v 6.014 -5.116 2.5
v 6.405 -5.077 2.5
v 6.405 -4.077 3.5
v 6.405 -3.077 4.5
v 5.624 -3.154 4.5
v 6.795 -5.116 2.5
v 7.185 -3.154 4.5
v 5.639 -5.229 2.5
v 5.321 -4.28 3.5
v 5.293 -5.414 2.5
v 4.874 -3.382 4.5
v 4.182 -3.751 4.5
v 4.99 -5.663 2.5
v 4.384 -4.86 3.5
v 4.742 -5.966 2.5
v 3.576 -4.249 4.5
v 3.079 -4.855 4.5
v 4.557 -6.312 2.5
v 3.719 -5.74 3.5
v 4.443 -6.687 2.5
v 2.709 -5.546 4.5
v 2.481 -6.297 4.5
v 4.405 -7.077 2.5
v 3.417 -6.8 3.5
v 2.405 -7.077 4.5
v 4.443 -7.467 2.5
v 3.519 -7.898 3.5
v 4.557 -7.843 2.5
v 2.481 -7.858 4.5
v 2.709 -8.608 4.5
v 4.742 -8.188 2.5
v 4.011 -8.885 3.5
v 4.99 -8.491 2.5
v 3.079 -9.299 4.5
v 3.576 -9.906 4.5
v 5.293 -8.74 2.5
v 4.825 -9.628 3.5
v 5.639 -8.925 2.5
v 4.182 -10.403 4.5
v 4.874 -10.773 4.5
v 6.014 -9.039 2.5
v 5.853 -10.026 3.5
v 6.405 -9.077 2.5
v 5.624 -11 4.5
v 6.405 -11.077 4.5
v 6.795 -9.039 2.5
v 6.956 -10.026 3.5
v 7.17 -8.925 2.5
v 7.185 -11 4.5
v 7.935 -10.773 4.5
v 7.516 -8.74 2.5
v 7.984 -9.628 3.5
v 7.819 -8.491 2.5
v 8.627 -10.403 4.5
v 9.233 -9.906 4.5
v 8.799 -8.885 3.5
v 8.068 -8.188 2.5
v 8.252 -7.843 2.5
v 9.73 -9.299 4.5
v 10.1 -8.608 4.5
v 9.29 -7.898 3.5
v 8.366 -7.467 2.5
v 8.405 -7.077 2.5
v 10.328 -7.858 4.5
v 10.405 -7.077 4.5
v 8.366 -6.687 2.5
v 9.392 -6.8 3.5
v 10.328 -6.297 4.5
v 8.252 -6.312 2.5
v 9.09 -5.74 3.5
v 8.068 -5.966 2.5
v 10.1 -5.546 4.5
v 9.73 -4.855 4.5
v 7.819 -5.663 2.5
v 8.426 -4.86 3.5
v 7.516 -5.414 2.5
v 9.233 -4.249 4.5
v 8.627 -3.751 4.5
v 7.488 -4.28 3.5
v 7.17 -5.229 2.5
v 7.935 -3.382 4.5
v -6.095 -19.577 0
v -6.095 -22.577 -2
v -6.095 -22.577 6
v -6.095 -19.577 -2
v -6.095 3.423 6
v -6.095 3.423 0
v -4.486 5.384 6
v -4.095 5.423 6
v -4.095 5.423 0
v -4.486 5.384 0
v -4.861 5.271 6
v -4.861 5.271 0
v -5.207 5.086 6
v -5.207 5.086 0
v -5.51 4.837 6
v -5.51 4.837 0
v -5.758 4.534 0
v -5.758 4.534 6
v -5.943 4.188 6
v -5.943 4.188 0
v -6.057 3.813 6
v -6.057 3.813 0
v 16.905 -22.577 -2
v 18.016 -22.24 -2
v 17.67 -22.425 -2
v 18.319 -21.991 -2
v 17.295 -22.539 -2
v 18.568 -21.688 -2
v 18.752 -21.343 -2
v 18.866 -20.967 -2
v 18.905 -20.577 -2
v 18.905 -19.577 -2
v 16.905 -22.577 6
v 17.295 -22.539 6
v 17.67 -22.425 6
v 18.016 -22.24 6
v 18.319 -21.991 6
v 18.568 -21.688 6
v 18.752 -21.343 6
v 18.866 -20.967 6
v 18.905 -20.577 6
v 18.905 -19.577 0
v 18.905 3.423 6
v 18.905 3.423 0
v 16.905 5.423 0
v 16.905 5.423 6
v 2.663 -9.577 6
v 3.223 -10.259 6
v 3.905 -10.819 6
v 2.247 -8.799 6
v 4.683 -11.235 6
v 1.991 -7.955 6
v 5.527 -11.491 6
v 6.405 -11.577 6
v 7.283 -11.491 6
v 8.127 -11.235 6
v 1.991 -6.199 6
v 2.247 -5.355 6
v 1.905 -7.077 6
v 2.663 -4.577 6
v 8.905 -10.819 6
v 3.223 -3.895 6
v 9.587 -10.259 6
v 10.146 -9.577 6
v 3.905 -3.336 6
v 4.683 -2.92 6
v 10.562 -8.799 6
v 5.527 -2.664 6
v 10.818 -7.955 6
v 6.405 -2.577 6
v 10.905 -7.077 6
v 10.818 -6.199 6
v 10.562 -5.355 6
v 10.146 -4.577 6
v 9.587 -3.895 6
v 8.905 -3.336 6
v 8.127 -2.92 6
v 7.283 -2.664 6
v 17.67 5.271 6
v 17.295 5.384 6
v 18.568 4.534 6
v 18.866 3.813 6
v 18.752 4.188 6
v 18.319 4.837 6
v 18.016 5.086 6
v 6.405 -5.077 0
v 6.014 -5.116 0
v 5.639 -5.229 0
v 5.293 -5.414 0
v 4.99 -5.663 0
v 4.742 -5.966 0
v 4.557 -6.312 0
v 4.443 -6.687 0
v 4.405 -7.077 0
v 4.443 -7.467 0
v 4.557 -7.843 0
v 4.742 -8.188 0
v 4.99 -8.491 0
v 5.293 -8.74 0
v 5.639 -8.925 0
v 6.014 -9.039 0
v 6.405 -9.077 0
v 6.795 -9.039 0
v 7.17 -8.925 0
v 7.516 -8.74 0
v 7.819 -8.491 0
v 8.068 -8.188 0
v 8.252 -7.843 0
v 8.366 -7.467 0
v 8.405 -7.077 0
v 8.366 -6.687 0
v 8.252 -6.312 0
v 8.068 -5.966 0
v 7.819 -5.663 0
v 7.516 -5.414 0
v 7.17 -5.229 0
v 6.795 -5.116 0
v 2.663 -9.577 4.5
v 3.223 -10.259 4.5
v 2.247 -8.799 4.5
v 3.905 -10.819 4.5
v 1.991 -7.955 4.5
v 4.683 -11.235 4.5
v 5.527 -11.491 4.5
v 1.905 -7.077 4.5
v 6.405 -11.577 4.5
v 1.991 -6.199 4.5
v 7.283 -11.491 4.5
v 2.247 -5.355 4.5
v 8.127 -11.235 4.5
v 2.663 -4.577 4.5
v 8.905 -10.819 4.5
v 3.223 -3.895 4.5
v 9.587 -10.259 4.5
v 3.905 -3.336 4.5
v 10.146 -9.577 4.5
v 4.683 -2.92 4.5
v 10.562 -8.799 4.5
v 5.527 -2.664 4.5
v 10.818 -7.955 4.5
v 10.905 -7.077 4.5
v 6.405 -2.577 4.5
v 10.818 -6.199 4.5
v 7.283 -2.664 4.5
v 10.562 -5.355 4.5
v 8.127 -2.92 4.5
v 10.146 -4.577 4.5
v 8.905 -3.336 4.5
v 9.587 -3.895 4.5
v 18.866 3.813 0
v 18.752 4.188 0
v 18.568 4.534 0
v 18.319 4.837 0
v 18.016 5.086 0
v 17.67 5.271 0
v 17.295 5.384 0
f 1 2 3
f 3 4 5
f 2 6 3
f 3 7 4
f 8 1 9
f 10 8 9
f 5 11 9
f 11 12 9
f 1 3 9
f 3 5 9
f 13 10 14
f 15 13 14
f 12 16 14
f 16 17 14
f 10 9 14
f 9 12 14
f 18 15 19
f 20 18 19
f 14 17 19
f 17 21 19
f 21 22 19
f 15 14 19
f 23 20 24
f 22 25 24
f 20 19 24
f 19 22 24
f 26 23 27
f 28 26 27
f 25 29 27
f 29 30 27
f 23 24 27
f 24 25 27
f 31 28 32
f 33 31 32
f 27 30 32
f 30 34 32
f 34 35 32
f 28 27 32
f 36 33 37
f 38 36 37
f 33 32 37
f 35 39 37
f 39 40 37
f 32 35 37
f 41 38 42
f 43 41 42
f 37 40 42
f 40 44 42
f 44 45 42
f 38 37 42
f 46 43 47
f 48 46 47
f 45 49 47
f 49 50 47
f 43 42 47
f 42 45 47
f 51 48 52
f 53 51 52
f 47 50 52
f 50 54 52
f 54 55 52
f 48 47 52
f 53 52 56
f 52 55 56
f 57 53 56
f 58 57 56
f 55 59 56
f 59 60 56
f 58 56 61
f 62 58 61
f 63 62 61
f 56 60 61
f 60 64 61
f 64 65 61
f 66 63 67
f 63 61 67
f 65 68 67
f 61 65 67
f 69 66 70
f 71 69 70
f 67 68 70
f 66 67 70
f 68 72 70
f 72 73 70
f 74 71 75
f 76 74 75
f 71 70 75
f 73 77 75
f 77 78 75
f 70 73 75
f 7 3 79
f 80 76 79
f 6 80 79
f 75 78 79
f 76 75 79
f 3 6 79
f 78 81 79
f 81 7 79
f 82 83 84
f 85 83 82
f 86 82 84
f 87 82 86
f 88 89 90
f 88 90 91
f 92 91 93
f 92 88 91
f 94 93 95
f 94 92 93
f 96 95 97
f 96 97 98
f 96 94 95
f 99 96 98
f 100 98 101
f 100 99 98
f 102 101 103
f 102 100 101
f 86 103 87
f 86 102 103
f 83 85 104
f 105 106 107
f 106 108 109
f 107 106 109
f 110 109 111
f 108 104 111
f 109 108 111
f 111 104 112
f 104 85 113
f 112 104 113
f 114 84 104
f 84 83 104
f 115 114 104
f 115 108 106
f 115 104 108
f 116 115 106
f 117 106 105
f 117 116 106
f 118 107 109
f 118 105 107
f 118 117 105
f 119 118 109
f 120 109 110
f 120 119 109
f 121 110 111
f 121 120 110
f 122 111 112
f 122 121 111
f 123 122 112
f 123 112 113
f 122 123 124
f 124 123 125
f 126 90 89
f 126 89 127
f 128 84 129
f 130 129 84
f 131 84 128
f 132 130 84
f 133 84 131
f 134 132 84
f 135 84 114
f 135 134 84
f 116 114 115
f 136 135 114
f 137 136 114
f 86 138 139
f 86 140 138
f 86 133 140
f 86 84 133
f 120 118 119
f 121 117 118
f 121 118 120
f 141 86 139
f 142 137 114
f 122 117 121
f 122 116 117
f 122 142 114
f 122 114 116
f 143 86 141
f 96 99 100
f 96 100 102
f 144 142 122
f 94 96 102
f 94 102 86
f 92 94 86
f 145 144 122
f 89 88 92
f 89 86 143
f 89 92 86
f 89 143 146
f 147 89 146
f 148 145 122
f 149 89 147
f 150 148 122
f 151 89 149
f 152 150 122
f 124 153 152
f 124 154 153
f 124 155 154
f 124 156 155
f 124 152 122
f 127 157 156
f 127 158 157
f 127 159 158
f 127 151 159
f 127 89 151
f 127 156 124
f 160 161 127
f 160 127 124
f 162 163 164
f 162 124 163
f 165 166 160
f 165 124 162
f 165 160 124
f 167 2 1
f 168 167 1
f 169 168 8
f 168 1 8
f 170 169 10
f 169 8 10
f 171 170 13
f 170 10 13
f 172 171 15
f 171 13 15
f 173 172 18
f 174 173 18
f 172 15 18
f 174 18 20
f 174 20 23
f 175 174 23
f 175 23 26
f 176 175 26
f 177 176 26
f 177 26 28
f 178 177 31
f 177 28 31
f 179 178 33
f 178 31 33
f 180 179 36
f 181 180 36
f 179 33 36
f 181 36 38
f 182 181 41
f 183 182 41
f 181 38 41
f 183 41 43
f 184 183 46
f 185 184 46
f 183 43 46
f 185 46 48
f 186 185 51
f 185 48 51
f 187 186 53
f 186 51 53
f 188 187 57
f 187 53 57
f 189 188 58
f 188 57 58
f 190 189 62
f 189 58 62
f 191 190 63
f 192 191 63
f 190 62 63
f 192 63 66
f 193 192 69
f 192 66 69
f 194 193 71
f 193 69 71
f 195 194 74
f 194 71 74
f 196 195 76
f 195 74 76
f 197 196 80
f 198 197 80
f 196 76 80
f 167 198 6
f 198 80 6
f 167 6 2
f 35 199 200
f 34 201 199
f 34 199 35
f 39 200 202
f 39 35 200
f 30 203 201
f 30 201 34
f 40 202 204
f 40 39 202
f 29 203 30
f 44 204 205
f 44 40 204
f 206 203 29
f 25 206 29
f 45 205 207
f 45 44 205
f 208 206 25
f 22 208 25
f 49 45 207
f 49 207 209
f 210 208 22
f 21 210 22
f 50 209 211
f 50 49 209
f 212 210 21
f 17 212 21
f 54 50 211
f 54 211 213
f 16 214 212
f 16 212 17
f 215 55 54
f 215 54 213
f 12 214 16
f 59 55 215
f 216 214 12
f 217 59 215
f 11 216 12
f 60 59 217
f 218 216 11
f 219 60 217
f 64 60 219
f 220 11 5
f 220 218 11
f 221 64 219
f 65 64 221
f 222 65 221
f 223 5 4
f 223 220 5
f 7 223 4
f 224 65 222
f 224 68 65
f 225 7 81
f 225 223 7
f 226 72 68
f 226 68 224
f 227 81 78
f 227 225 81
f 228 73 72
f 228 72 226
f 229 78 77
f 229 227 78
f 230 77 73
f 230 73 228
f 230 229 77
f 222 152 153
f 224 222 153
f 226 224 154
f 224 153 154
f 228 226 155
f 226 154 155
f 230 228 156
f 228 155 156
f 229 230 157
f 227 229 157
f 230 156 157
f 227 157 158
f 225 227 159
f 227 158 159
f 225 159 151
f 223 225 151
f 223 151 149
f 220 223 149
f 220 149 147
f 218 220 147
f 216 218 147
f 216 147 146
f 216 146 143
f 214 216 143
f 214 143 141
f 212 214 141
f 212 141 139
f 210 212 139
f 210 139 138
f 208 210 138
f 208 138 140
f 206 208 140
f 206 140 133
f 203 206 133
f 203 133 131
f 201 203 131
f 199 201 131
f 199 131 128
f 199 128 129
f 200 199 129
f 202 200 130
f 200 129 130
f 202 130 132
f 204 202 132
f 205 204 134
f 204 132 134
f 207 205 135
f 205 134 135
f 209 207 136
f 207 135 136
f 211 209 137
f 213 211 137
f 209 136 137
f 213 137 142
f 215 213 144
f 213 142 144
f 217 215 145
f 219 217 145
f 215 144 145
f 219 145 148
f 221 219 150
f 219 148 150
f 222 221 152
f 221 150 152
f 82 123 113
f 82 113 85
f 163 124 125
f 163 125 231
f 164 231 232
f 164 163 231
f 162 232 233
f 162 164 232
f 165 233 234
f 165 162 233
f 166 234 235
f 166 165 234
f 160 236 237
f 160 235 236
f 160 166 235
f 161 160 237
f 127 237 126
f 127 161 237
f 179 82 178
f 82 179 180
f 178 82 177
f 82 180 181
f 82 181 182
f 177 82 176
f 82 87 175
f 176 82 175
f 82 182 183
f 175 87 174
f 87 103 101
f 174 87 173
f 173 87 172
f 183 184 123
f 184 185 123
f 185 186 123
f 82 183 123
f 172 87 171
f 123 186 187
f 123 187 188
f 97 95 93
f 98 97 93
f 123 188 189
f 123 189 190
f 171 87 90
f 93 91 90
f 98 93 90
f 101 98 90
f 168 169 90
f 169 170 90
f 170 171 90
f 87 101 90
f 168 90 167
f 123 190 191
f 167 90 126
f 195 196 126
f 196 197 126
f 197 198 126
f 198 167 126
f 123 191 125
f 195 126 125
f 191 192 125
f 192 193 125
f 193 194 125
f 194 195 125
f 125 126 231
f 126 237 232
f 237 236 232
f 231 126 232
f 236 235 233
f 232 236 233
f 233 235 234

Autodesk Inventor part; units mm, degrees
ref_plane "YZ Plane" through (0, 0, 0) normal (1, 0, 0) x (0, 1, 0)
ref_plane "XZ Plane" through (0, 0, 0) normal (0, 1, 0) x (-1, 0, 0)
ref_plane "XY Plane" through (0, 0, 0) normal (0, 0, 1) x (1, 0, 0)
sketch "Sketch1" plane through (0, 0, 0) normal (0, 0, 1) x (1, 0, 0)
  line L0 (-6.0954, 5.4228) -> (18.9046, 5.4228)
  line L1 (18.9046, 5.4228) -> (18.9046, -19.5772)
  line L2 (18.9046, -19.5772) -> (-6.0954, -19.5772)
  line L3 (-6.0954, -19.5772) -> (-6.0954, 5.4228)
  line L4 (-6.0954, -22.5772) -> (21.9046, -22.5772)
  line L5 (21.9046, -22.5772) -> (21.9046, 5.4228)
  line L6 (18.9046, 5.4228) -> (21.9046, 5.4228)
  line L7 (-6.0954, -19.5772) -> (-6.0954, -22.5772)
  line L8 (18.9046, -19.5772) -> (18.9046, -22.5772)
  point P0 (0, 0)
  point P1 (6.4046, -7.0772)
  dimension "d0" = 25
  dimension "d1" = 25
  dimension "d2" = 3
  dimension "d3" = 3
  dimension "d4" = 12.5
  dimension "d5" = 12.5
extrude "Extrusion1" add sketch "Sketch1" along normal blind 6
extrude "Extrusion2" add sketch "Sketch1" against normal blind 2 contours L6 L5 L4 L8 L1 | L2 L8 L4 L7
hole "Hole1" at (6.4046, -7.0772, 0) direction (0, 0, 1) diameter 4 end through all
sketch "Sketch2" plane through (0, 0, 6) normal (0, 0, 1) x (1, 0, 0)
  circle A0 centre (6.4046, -7.0772) radius 2 projected
  line L0 (-6.0954, 5.4228) -> (-6.0954, -22.5772) projected
  line L1 (-6.0954, -22.5772) -> (21.9046, -22.5772) projected
  line L2 (21.9046, -22.5772) -> (21.9046, 5.4228) projected
  line L3 (21.9046, 5.4228) -> (-6.0954, 5.4228) projected
  circle A1 centre (6.4046, -7.0772) radius 2 projected
  circle A2 centre (6.4046, -7.0772) radius 4.5
  point P0 (0, 0)
  dimension "d17" = 9
extrude "Extrusion3" cut sketch "Sketch2" against normal blind 1.5 contours A2
chamfer "Chamfer1" distance 2 angle 45 1 edges at (6.4046, -9.0772, 4.5)
sketch "Sketch3" plane through (0, 0, -2) normal (0, 0, -1) x (-1, 0, 0)
  line L0 (6.0954, -19.5772) -> (-18.9046, -19.5772) projected
  line L1 (-18.9046, -19.5772) -> (-18.9046, 5.4228) projected
  line L2 (-18.9046, 5.4228) -> (-21.9046, 5.4228) projected
  line L3 (-21.9046, 5.4228) -> (-21.9046, -22.5772) projected
  line L4 (-21.9046, -22.5772) -> (6.0954, -22.5772) projected
  line L5 (6.0954, -22.5772) -> (6.0954, -19.5772) projected
  line L6 (-18.9046, 5.4228) -> (-21.9046, 5.4228) projected
  line L7 (-21.9046, 5.4228) -> (-18.9046, 5.4228)
  line L8 (-18.9046, 5.4228) -> (-18.9046, -22.5772)
  line L9 (-18.9046, -22.5772) -> (-21.9046, -22.5772)
  line L10 (-21.9046, -22.5772) -> (-21.9046, 5.4228)
  point P0 (0, 0)
extrude "Extrusion4" cut sketch "Sketch3" against normal through all contours L8 L4 L3 L2 L1
fillet "Fillet2" radius 2 3 edges at (18.9046, -22.5772, 2) (-6.0954, 5.4228, 3) (18.9046, 5.4228, 3)
equation "\"d4\" = 0.5 * d0"
properties part number "3DP_PLA_Base_plate_side_leg" material "ABS Plastic"
